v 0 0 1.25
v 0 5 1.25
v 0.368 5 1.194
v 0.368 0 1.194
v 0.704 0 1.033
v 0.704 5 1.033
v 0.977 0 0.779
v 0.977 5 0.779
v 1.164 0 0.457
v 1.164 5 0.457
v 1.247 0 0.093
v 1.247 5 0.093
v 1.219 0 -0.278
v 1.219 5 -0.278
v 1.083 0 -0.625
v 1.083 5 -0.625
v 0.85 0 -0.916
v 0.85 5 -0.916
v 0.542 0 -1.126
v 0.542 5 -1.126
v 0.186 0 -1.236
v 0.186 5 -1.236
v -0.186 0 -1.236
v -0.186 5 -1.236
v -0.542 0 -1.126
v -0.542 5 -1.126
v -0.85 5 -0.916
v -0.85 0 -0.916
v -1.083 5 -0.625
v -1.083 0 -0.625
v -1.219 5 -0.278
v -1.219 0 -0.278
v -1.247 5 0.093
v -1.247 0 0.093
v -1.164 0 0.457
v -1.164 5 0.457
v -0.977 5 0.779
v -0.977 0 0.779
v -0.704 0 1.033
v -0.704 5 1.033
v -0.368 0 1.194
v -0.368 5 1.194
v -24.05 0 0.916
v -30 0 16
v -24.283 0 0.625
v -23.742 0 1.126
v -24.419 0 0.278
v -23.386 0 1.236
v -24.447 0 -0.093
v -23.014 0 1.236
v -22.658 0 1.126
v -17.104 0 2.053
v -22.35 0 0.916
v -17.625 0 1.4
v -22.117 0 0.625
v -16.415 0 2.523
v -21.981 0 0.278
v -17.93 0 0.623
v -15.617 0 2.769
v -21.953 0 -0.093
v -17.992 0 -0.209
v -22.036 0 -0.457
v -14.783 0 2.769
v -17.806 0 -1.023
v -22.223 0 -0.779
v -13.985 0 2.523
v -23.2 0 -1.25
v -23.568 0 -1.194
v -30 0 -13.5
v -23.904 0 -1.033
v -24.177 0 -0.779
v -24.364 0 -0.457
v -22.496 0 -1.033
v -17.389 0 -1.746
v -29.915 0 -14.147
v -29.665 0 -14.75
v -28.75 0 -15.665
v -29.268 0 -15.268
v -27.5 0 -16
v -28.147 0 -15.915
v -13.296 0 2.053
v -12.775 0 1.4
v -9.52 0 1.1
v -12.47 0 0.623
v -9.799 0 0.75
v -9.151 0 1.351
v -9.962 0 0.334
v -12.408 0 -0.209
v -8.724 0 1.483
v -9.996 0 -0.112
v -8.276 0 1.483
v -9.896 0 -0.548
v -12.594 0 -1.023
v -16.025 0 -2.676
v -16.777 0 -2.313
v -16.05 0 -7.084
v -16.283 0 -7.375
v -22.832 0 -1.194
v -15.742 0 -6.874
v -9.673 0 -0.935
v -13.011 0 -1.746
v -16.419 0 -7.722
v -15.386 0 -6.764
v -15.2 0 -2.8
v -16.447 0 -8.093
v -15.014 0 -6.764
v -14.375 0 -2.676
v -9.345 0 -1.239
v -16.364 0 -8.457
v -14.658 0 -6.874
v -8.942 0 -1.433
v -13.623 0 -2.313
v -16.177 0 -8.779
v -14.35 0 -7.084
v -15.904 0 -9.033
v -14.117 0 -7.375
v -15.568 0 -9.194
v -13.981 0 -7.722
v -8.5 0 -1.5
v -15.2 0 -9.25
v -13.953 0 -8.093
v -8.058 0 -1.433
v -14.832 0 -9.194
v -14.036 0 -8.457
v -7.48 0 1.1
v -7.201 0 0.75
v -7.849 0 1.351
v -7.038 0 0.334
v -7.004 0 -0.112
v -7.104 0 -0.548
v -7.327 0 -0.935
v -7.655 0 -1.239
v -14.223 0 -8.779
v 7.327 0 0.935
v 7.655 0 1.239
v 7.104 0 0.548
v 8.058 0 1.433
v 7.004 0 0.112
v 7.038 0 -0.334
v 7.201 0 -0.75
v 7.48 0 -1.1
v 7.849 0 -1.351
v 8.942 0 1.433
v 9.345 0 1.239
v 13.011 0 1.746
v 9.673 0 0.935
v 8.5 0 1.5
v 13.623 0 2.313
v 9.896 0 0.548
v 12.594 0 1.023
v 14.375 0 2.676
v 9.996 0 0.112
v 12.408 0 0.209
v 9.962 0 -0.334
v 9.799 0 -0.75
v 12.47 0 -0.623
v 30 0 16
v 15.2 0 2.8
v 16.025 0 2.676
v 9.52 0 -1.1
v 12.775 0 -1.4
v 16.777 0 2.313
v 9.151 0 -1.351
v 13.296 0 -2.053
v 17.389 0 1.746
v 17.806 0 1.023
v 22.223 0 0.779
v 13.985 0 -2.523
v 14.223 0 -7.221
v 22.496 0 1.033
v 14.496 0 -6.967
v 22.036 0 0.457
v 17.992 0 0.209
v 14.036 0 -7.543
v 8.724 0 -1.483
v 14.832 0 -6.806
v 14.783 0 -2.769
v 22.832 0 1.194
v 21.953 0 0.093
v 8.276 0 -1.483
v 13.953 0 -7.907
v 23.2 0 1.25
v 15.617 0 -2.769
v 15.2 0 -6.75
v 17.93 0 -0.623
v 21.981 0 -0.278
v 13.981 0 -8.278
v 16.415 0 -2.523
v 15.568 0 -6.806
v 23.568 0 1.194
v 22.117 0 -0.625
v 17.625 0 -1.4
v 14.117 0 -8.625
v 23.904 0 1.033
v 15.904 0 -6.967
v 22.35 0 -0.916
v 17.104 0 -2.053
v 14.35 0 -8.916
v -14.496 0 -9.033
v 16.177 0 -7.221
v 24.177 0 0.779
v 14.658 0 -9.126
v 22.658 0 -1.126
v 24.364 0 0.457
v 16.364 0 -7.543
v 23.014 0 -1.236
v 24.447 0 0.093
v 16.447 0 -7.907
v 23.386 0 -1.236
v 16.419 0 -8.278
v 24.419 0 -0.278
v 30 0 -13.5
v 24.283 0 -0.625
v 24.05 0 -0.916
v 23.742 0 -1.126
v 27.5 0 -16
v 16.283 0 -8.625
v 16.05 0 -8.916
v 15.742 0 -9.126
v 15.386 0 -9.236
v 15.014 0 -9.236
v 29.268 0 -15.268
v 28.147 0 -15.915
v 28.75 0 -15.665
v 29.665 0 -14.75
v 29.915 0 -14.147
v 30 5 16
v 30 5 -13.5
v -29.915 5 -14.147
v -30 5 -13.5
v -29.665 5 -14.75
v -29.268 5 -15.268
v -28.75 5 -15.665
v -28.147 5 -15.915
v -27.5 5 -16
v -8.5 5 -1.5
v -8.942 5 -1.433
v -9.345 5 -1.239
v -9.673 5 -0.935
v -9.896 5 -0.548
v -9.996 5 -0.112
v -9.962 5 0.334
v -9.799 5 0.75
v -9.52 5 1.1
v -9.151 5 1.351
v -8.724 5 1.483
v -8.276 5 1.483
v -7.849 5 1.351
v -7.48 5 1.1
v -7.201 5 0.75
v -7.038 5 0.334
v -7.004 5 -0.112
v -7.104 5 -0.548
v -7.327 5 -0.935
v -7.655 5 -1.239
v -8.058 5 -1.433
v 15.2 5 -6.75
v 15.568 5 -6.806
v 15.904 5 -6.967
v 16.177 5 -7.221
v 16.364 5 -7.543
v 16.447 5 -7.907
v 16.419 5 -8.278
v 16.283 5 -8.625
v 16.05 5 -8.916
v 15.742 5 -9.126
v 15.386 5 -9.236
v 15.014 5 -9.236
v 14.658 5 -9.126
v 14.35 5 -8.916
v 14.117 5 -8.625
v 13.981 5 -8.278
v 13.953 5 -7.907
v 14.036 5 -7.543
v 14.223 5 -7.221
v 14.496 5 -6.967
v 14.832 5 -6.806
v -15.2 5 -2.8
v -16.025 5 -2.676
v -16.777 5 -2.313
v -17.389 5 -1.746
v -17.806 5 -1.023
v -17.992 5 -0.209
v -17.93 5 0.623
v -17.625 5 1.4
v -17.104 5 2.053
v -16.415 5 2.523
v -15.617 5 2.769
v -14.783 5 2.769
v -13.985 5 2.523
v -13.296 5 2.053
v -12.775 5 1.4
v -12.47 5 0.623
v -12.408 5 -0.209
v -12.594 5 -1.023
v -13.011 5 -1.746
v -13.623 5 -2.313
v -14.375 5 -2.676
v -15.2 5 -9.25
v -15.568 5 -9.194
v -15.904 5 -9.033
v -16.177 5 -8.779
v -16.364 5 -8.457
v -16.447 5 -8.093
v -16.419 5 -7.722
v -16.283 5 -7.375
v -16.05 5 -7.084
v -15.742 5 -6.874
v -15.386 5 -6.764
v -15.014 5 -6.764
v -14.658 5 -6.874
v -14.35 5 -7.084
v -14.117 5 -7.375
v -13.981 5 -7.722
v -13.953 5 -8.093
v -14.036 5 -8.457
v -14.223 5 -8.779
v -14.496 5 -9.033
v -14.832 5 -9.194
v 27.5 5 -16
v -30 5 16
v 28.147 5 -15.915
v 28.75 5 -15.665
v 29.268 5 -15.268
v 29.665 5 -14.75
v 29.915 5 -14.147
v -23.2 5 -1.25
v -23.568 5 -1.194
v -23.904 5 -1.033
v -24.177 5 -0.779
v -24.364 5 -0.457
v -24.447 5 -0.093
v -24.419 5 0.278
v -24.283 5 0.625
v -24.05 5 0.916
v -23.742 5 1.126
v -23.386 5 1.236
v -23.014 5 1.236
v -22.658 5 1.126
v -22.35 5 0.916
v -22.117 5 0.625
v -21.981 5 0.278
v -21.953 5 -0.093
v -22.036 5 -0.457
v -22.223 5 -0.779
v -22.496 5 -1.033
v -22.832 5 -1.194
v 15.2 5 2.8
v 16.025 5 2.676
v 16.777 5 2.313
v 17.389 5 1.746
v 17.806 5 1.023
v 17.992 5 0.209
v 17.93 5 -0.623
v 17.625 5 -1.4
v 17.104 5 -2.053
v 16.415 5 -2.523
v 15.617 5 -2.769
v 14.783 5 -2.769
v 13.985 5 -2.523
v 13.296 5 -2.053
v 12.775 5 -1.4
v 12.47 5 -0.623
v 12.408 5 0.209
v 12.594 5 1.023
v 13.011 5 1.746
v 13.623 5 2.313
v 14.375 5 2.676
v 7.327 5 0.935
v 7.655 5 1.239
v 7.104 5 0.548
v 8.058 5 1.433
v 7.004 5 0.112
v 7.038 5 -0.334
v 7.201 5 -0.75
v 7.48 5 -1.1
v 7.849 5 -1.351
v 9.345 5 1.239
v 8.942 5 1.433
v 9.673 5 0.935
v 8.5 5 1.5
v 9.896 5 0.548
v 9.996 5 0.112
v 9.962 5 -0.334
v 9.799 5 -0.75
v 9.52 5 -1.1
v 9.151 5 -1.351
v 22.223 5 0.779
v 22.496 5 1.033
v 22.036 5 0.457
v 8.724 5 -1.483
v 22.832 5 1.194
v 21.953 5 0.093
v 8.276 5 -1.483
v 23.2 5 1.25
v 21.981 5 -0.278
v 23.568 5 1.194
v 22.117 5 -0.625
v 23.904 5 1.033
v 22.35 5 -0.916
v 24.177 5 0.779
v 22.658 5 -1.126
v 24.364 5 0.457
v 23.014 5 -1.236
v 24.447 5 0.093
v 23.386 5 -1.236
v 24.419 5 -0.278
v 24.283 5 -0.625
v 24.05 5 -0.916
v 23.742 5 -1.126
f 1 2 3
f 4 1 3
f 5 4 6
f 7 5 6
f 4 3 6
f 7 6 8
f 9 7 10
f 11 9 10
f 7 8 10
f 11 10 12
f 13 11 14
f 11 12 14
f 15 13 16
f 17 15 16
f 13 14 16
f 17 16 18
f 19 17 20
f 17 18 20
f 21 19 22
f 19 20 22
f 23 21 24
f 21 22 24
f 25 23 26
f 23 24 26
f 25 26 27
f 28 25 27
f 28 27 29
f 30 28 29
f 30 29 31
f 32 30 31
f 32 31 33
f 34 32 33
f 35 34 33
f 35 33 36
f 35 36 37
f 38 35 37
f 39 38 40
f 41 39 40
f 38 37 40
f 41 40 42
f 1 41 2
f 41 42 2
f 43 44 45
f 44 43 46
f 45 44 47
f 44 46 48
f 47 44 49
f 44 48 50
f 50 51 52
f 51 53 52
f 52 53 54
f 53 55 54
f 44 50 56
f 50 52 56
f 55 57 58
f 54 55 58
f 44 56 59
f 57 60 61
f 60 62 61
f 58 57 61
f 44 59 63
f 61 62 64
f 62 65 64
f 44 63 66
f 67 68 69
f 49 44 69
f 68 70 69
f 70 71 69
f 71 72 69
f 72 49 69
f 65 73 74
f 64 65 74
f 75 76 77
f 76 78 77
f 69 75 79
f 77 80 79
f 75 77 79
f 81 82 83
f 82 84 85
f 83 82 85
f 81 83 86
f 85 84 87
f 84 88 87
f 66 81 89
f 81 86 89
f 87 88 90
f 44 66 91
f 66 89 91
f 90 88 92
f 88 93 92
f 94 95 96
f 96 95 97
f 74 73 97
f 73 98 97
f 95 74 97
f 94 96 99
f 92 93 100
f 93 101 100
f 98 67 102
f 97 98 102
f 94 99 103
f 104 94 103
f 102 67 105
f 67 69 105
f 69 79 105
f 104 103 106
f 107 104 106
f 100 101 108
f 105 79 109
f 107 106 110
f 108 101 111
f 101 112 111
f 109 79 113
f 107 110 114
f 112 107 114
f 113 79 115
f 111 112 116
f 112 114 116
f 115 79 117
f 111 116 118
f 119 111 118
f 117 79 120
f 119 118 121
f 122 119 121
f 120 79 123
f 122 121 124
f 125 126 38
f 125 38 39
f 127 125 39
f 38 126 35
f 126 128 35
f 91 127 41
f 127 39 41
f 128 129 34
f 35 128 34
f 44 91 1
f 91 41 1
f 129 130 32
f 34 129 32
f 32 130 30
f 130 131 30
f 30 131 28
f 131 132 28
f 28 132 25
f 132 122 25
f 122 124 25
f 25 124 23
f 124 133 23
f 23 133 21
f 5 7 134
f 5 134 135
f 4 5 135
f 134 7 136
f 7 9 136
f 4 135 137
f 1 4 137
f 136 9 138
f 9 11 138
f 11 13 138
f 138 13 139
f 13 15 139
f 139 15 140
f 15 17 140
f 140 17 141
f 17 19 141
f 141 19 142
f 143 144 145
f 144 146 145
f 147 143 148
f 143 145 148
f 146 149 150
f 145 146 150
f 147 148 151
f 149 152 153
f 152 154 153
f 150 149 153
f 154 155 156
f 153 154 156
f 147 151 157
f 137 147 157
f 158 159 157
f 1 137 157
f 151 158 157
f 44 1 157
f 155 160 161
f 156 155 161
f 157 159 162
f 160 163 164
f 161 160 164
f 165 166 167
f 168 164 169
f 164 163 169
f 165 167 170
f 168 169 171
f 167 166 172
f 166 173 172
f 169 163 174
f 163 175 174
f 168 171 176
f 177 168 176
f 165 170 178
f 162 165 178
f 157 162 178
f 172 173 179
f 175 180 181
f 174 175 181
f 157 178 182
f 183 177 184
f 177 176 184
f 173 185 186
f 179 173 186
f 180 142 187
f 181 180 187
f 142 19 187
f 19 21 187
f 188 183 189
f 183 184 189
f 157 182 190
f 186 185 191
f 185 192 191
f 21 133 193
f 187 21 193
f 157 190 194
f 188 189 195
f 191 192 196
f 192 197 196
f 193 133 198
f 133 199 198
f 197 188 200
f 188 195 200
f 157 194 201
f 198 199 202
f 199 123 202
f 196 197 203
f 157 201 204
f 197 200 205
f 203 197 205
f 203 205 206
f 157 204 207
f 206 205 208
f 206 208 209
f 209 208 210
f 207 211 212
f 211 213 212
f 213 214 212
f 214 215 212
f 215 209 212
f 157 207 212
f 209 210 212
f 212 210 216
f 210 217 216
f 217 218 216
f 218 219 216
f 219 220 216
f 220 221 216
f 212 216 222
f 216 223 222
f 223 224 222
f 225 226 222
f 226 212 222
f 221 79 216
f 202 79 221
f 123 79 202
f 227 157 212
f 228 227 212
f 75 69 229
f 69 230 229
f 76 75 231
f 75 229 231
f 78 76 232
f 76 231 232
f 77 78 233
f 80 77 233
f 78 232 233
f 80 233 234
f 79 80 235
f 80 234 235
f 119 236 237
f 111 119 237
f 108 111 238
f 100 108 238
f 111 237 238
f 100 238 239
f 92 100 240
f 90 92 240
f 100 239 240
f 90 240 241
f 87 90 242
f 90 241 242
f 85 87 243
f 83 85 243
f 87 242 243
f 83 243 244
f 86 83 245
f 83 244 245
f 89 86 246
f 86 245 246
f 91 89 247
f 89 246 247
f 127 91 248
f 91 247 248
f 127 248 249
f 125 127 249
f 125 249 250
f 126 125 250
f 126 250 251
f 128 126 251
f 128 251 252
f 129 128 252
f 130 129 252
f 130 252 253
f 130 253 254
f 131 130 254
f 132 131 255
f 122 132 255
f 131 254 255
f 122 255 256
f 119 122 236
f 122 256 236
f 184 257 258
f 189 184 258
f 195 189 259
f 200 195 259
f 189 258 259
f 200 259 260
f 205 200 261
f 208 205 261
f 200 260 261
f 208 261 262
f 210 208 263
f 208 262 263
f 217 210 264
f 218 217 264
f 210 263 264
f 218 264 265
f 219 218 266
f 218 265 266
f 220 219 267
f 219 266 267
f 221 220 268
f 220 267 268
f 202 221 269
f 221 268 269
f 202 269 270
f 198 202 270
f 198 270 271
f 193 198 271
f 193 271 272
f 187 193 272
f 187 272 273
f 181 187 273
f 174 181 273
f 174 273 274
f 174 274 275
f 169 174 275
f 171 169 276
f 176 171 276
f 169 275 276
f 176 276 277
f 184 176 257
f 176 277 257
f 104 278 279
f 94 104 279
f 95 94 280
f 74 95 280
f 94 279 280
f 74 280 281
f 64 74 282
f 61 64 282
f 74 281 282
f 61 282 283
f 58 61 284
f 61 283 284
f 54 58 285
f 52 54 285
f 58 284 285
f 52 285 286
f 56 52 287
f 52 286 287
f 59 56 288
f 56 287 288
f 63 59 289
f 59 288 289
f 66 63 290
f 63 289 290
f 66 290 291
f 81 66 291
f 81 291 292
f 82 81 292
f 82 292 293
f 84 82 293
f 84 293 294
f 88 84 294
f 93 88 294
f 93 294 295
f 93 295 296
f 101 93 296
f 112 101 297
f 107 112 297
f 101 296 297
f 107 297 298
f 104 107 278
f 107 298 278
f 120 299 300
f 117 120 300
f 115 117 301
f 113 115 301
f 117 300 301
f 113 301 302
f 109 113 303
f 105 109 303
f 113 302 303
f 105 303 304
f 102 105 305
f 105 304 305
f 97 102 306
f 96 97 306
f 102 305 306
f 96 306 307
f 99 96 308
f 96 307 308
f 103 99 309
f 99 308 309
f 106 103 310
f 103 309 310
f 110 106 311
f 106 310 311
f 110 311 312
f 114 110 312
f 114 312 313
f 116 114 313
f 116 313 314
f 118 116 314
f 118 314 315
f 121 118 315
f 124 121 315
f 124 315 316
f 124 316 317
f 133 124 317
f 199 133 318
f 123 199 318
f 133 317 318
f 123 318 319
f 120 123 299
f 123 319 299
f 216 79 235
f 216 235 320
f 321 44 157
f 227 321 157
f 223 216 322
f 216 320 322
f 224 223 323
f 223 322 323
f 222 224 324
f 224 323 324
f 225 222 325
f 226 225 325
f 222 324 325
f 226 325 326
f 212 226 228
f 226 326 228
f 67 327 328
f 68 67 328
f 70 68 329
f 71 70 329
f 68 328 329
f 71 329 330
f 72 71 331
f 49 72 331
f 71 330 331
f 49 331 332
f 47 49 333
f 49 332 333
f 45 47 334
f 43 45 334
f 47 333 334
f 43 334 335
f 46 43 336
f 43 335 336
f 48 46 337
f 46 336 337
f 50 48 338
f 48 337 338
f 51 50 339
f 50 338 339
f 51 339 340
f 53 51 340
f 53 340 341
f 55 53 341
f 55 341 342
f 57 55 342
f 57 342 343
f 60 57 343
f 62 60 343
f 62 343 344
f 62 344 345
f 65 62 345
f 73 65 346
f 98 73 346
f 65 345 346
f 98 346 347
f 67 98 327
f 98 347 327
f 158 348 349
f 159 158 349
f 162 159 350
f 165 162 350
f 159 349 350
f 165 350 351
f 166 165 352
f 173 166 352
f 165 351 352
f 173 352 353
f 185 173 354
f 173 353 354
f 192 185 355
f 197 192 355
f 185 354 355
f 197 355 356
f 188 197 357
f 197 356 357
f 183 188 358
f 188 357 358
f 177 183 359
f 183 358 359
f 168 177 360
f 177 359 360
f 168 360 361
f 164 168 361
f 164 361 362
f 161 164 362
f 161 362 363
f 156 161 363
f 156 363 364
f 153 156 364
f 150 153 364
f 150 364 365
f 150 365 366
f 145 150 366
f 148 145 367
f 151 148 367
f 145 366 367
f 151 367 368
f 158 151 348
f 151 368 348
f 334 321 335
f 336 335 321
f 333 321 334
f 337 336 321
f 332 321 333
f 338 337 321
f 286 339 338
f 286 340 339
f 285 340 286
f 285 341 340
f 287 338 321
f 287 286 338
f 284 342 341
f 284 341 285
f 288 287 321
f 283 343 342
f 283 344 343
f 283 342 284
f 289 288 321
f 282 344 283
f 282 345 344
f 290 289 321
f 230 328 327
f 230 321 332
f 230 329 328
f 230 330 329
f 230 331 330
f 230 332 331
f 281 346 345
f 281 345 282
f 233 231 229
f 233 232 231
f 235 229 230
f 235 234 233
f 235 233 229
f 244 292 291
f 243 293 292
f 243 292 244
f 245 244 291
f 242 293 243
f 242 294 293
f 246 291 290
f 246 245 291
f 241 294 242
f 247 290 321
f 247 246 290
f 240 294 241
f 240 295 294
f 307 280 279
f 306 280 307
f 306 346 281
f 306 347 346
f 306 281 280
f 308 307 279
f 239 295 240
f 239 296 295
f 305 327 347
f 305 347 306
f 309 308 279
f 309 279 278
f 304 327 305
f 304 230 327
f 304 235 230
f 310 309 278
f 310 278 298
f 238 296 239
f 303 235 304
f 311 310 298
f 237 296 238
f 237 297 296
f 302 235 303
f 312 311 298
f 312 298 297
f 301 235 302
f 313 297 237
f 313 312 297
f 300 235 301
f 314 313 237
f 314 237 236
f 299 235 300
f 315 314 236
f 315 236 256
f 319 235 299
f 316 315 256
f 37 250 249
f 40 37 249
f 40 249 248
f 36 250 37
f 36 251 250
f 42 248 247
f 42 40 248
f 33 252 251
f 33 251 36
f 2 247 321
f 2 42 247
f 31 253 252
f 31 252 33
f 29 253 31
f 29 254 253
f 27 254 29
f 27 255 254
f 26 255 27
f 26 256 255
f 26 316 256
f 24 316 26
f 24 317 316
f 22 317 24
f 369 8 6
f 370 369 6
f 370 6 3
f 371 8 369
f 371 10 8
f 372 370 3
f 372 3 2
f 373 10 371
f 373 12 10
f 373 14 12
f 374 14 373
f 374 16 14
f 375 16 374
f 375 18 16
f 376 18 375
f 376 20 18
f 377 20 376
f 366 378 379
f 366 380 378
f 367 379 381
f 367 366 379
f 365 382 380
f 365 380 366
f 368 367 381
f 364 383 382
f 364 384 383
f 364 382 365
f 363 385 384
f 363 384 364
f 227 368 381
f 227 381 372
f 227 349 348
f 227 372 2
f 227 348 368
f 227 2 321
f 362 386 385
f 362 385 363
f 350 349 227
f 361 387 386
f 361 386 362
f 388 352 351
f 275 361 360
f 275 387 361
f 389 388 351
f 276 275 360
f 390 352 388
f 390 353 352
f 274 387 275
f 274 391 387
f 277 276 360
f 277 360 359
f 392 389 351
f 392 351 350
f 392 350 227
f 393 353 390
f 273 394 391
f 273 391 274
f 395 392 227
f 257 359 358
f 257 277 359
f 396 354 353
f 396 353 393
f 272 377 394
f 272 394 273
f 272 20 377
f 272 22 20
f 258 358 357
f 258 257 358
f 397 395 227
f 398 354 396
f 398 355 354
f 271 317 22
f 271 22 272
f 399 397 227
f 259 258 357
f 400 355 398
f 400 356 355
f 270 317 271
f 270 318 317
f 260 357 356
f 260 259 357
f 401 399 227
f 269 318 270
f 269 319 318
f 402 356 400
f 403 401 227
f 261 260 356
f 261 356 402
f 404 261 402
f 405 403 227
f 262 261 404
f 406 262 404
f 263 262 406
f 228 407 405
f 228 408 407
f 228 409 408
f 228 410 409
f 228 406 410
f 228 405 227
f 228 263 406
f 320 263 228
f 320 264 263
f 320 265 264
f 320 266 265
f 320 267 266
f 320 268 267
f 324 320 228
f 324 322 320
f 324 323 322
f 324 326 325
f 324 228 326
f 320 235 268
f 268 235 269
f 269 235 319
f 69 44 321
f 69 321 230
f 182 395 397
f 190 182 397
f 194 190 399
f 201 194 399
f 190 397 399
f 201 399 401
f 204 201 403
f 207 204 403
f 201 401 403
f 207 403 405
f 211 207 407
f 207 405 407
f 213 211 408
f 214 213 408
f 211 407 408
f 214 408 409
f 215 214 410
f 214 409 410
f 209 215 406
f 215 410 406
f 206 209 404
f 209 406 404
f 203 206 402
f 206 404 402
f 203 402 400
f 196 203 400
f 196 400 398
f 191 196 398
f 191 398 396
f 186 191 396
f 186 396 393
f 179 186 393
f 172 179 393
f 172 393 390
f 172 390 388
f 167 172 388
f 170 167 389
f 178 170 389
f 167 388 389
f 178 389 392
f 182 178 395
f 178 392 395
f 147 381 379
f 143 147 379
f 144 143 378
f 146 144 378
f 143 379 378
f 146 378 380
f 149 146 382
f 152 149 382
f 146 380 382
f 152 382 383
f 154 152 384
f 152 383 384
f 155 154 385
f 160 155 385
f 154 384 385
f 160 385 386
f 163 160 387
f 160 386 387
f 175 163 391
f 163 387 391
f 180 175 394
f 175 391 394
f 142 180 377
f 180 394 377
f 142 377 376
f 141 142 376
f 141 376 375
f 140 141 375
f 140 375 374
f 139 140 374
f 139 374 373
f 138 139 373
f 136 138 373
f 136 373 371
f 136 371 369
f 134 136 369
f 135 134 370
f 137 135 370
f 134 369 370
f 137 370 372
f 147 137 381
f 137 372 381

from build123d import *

# Parameters (mm, degrees)
SKETCH_1_W          = 60
SKETCH_1_H          = 32
EXTRUDE_1_DEPTH     = 5
SKETCH_2_R          = 1.5
SKETCH_2_R_2        = 1.25
SKETCH_2_R_3        = 2.8
CUT_EXTRUDE_1_DEPTH = 5
FILLET_1_R          = 2.5


with BuildPart() as part:
    # 草图1 → 凸台-拉伸1 (new body)
    with BuildSketch(Plane(origin=(0, 0, 0), x_dir=(1, 0, 0), z_dir=(0, 1, 0))):
        Rectangle(SKETCH_1_W, SKETCH_1_H)
    extrude(amount=EXTRUDE_1_DEPTH)

    # 草图2 → 切除-拉伸1 (cut)
    with BuildSketch(Plane(origin=(0, 5, 0), x_dir=(1, 0, 0), z_dir=(0, 1, 0))):
        with Locations(Location((8.5, 0, 0), (0, 0, 270))):
            Circle(SKETCH_2_R)
        with Locations(Location((-8.5, 0, 0), (0, 0, 90))):
            Circle(SKETCH_2_R)
        with Locations(Location((0, 0, 0), (0, 0, 270))):
            Circle(SKETCH_2_R_2)
        with Locations(Location((15.2, 0, 0), (0, 0, 270))):
            Circle(SKETCH_2_R_3)
        with Locations(Location((-15.2, 0, 0), (0, 0, 90))):
            Circle(SKETCH_2_R_3)
        with Locations(Location((15.2, 8, 0), (0, 0, 270))):
            Circle(SKETCH_2_R_2)
        with Locations(Location((23.2, 0, 0), (0, 0, 270))):
            Circle(SKETCH_2_R_2)
        with Locations(Location((-23.2, 0, 0), (0, 0, 90))):
            Circle(SKETCH_2_R_2)
        with Locations(Location((-15.2, 8, 0), (0, 0, 90))):
            Circle(SKETCH_2_R_2)
    extrude(amount=-CUT_EXTRUDE_1_DEPTH, mode=Mode.SUBTRACT)

    # 圆角1
    fillet_1_edges = [part.edges().sort_by_distance(p)[0] for p in [
        (-30, 2.5, -16),
        (30, 2.5, -16),
    ]]
    fillet(fillet_1_edges, radius=FILLET_1_R)


solid = part.part
